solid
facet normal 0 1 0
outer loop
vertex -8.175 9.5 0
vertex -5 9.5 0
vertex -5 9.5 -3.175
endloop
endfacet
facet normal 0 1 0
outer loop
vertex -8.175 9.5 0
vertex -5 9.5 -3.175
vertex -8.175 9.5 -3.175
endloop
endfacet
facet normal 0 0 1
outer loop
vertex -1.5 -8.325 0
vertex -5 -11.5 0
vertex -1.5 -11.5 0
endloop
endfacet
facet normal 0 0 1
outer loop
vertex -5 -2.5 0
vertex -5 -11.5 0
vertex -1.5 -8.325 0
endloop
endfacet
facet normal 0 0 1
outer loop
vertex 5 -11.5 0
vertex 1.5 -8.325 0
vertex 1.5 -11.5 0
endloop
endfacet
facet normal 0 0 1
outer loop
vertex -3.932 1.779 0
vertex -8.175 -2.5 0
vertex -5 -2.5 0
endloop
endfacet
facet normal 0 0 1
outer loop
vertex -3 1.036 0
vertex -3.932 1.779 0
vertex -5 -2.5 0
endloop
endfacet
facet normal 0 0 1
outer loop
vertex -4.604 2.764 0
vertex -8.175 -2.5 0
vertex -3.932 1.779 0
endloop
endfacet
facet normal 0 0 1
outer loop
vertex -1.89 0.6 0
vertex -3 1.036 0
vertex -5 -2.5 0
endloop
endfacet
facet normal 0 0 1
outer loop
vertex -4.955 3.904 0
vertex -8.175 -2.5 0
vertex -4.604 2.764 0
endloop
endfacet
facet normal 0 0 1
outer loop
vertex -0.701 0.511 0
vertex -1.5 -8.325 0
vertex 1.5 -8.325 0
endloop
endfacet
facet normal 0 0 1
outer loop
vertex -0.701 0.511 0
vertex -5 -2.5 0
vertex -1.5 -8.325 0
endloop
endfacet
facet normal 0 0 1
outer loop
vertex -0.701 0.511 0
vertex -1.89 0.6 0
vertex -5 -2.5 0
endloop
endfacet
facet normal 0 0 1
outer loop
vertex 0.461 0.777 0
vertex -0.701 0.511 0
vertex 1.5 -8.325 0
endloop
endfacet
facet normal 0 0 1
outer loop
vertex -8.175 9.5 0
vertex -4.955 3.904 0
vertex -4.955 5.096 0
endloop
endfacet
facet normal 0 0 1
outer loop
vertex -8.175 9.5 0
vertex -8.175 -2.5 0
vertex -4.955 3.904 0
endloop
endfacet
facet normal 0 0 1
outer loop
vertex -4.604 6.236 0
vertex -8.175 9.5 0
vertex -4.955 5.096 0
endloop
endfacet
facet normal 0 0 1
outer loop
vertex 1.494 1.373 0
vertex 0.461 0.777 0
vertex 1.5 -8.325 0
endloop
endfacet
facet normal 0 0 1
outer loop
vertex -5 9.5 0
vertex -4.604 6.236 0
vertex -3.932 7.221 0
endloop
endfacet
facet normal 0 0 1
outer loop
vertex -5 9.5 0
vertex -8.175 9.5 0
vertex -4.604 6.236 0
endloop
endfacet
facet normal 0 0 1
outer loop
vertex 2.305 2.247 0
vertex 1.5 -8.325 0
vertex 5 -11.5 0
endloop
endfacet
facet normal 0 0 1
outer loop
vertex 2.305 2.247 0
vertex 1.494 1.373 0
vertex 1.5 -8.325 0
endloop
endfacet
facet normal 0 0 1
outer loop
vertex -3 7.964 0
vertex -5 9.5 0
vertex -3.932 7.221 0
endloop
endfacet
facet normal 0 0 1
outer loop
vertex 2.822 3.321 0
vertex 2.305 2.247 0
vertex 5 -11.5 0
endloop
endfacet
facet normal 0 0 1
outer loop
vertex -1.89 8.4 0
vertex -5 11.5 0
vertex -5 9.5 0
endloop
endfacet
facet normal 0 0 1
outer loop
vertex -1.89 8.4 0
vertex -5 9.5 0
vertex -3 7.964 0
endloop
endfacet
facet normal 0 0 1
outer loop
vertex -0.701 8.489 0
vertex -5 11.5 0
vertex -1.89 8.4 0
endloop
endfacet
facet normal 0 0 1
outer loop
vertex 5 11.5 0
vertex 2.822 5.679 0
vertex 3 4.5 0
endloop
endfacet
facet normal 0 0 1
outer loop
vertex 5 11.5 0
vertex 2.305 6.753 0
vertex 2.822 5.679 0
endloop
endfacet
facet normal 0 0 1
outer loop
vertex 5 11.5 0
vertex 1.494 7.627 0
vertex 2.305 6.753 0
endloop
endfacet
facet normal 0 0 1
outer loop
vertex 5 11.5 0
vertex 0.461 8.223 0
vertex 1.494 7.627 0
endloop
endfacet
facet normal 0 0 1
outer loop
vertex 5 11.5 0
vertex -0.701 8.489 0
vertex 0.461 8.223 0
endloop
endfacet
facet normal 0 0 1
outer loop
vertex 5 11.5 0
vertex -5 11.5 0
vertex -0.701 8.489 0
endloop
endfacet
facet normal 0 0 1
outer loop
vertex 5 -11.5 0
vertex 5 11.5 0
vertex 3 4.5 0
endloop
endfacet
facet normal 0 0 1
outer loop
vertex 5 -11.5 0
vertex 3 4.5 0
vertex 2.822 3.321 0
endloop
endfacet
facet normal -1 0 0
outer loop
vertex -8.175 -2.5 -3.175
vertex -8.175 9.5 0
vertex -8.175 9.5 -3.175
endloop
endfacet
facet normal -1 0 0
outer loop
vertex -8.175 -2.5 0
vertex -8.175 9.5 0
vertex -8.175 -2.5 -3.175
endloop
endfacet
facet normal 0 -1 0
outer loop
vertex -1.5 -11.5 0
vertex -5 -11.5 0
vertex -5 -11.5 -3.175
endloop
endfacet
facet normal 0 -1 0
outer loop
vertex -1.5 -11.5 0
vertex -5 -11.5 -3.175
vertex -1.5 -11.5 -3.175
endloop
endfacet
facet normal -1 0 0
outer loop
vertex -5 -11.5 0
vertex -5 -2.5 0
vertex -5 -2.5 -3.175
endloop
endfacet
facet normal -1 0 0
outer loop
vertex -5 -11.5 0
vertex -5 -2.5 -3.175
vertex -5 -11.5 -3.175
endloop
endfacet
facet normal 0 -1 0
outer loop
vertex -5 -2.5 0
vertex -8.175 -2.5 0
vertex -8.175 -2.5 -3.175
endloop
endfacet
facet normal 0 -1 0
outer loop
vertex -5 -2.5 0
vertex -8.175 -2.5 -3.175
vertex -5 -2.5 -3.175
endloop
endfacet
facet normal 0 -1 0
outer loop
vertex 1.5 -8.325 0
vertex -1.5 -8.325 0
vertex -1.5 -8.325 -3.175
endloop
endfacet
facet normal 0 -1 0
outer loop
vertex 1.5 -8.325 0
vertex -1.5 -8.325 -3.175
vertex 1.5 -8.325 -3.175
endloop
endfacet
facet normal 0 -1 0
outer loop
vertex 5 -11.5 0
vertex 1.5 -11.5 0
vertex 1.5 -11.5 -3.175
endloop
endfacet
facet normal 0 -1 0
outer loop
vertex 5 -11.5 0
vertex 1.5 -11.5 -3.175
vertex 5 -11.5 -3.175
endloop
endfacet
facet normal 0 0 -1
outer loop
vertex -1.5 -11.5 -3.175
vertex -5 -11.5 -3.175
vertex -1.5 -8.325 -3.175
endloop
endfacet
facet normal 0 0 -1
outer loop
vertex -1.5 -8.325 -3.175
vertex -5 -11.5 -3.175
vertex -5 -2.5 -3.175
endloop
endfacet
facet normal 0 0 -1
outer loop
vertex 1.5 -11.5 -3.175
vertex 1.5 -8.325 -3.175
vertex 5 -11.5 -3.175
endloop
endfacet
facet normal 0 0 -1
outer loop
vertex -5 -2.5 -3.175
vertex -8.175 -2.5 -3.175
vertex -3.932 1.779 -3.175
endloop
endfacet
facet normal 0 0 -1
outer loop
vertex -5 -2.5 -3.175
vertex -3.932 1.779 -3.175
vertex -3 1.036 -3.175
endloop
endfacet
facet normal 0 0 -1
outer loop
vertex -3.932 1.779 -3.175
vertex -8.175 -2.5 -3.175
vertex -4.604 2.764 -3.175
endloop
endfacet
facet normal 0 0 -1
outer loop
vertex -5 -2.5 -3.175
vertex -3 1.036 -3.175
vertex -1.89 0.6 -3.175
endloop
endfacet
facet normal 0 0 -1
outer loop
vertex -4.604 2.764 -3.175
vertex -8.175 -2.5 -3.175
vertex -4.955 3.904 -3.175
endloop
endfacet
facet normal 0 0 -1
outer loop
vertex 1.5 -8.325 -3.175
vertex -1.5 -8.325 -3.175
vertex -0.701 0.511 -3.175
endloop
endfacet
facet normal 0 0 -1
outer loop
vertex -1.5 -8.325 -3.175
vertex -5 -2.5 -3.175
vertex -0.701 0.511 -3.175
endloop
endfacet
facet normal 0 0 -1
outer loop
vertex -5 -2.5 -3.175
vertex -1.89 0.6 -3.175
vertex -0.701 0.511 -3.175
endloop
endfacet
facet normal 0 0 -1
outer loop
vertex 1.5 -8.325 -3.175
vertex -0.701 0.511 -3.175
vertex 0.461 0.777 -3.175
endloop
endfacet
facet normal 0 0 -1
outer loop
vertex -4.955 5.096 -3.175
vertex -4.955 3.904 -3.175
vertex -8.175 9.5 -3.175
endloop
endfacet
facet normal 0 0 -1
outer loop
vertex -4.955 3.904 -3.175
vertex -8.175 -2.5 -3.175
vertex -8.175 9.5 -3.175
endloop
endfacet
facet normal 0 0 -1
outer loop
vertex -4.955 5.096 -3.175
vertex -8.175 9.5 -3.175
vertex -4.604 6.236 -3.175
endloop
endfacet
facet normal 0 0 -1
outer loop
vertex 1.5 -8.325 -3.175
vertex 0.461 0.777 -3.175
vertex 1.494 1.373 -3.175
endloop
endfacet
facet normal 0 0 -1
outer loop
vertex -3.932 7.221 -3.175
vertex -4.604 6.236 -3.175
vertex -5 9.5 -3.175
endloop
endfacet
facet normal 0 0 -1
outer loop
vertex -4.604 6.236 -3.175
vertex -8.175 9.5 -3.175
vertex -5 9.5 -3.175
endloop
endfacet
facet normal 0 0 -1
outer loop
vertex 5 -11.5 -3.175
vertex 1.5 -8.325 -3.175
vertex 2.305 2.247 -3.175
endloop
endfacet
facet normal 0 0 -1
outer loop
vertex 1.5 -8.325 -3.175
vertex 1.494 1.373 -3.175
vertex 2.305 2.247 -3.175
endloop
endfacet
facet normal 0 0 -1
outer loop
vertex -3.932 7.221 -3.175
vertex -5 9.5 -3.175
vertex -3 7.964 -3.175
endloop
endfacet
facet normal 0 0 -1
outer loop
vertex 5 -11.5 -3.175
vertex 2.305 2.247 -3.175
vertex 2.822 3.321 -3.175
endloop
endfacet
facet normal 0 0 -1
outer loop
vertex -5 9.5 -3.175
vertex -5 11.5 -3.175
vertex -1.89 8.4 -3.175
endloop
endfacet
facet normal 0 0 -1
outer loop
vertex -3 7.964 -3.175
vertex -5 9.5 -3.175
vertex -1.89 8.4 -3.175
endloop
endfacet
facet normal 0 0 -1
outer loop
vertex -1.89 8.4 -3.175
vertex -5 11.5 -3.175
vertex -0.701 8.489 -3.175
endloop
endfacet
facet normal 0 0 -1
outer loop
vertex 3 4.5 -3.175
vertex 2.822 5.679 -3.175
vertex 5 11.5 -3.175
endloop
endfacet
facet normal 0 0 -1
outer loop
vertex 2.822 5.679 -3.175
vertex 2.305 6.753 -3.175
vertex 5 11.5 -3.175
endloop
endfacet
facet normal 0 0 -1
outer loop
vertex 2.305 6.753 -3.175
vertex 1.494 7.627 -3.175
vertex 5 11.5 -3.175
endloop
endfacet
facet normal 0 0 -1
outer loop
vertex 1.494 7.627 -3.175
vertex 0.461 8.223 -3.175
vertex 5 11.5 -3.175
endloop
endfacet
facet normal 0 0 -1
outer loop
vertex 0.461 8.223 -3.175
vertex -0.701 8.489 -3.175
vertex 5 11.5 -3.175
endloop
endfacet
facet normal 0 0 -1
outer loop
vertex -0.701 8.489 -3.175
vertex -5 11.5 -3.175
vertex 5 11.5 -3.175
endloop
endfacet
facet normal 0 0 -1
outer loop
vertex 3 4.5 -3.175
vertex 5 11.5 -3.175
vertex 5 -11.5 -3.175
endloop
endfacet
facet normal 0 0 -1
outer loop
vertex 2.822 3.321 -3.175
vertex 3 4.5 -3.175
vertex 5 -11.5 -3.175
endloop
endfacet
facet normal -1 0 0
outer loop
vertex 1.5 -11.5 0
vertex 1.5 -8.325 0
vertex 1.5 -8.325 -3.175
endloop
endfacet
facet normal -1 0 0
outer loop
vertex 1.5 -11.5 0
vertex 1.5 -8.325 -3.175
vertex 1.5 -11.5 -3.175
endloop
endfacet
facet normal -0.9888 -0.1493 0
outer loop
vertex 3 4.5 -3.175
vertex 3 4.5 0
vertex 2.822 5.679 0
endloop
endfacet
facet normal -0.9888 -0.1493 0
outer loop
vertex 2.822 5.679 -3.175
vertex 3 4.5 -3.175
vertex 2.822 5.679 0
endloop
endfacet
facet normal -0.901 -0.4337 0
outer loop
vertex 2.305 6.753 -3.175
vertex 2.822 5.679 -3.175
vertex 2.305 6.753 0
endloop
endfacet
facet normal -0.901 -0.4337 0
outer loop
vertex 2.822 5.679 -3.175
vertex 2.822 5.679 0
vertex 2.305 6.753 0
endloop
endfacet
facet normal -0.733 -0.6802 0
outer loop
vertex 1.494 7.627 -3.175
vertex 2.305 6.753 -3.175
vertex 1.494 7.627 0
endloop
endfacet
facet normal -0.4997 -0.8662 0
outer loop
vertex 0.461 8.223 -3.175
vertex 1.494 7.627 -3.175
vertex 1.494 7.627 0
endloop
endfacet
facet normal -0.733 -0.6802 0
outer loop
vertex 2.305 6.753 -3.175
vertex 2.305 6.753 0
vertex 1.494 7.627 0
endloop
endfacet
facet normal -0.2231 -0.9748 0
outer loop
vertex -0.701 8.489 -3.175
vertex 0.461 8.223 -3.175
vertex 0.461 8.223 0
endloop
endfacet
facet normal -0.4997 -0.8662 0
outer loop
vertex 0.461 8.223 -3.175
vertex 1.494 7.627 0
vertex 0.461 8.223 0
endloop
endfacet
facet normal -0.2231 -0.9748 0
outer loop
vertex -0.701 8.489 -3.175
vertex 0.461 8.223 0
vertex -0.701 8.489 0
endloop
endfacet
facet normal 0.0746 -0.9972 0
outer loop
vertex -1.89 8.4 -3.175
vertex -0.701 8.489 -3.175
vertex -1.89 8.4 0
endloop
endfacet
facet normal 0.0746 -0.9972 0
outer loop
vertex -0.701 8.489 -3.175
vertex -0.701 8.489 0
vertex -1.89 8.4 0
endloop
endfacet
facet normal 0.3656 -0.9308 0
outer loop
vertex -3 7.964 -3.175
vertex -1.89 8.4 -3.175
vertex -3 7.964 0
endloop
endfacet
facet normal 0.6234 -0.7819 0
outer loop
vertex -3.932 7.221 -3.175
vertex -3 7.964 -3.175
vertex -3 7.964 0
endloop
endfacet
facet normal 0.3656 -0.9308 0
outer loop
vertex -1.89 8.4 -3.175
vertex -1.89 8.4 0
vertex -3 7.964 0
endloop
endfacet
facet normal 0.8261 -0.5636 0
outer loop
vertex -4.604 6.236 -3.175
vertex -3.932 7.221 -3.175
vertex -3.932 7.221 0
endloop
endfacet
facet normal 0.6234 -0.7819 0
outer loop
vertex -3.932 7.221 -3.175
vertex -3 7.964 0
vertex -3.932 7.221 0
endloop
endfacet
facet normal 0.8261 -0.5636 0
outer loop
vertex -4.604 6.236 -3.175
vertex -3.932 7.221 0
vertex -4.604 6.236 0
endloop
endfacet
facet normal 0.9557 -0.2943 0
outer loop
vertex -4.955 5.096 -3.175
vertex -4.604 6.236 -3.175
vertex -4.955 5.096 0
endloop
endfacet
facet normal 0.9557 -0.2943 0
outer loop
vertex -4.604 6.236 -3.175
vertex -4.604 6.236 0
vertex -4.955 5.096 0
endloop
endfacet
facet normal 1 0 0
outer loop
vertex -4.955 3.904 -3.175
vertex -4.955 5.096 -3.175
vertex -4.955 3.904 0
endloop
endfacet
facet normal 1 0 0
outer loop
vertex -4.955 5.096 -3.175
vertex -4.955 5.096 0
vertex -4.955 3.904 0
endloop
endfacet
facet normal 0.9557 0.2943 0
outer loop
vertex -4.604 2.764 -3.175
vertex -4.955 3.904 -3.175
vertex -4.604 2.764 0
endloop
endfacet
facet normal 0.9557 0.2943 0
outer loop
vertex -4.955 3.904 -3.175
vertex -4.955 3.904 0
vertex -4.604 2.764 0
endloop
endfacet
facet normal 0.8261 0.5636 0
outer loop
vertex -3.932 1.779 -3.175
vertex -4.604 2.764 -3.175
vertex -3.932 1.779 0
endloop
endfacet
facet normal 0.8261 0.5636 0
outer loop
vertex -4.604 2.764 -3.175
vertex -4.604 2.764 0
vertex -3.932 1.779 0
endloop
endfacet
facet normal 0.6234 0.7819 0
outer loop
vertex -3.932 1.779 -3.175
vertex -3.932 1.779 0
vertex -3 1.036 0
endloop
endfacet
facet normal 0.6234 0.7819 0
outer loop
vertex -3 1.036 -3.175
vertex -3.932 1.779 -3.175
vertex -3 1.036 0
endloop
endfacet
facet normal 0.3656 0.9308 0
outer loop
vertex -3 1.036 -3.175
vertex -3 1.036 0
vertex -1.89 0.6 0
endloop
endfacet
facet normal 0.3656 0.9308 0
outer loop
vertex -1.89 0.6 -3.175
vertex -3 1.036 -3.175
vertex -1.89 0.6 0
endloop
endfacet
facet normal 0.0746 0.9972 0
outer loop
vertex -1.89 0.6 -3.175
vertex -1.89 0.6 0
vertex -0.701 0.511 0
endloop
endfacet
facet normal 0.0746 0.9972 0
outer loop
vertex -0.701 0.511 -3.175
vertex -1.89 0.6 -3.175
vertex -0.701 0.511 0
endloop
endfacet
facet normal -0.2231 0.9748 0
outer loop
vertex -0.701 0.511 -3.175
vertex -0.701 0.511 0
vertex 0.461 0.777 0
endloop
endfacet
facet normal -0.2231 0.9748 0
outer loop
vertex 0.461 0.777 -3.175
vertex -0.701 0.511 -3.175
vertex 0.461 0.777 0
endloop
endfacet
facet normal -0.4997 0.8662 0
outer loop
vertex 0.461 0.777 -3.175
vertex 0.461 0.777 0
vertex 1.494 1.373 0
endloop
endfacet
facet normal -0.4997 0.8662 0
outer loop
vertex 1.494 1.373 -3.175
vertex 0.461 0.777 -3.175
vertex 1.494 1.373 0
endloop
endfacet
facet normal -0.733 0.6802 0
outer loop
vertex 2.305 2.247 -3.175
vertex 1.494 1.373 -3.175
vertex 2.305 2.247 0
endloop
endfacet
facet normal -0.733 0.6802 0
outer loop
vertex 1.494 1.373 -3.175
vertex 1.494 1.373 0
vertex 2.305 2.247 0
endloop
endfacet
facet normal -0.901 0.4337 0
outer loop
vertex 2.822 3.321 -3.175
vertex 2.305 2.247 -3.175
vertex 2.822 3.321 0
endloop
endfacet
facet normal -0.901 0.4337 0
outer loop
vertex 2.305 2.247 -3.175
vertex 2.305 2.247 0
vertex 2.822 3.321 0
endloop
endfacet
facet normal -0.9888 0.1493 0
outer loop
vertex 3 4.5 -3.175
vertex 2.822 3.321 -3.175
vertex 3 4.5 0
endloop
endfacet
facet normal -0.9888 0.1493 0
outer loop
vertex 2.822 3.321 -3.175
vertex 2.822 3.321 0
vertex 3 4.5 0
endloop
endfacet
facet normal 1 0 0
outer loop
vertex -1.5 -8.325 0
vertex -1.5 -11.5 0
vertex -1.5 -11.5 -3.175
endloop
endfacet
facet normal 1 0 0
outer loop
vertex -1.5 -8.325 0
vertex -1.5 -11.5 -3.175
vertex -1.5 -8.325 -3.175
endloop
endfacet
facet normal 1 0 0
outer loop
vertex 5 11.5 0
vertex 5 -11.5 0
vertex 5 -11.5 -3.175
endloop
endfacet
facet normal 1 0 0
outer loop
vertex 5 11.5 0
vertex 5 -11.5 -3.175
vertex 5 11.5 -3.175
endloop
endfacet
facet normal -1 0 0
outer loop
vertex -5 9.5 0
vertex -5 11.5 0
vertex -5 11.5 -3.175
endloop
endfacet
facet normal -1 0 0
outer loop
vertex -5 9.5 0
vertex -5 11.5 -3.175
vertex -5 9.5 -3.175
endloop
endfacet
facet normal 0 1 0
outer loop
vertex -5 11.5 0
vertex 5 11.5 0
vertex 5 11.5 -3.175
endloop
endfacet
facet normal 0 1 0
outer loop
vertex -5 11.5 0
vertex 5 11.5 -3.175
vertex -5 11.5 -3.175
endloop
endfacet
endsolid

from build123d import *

# Parameters (mm, degrees)
SKETCH2_R           = 4
BOSS_EXTRUDE1_DEPTH = 3.175


with BuildPart() as part:
    # Sketch2 → Boss-Extrude1 (new body)
    with BuildSketch(Plane.XY):
        Polygon((-5, -11.5), (-1.5, -11.5), (-1.5, -8.325), (1.5, -8.325), (1.5, -11.5), (5, -11.5), (5, 11.5), (1.5, 11.5), (-1.5, 11.5), (-5, 11.5), (-5, 9.5), (-8.175, 9.5), (-8.175, -2.5), (-5, -2.5), align=None)
        with Locations((-1, 4.5)):
            Circle(SKETCH2_R, mode=Mode.SUBTRACT)
    extrude(amount=-BOSS_EXTRUDE1_DEPTH)


solid = part.part
